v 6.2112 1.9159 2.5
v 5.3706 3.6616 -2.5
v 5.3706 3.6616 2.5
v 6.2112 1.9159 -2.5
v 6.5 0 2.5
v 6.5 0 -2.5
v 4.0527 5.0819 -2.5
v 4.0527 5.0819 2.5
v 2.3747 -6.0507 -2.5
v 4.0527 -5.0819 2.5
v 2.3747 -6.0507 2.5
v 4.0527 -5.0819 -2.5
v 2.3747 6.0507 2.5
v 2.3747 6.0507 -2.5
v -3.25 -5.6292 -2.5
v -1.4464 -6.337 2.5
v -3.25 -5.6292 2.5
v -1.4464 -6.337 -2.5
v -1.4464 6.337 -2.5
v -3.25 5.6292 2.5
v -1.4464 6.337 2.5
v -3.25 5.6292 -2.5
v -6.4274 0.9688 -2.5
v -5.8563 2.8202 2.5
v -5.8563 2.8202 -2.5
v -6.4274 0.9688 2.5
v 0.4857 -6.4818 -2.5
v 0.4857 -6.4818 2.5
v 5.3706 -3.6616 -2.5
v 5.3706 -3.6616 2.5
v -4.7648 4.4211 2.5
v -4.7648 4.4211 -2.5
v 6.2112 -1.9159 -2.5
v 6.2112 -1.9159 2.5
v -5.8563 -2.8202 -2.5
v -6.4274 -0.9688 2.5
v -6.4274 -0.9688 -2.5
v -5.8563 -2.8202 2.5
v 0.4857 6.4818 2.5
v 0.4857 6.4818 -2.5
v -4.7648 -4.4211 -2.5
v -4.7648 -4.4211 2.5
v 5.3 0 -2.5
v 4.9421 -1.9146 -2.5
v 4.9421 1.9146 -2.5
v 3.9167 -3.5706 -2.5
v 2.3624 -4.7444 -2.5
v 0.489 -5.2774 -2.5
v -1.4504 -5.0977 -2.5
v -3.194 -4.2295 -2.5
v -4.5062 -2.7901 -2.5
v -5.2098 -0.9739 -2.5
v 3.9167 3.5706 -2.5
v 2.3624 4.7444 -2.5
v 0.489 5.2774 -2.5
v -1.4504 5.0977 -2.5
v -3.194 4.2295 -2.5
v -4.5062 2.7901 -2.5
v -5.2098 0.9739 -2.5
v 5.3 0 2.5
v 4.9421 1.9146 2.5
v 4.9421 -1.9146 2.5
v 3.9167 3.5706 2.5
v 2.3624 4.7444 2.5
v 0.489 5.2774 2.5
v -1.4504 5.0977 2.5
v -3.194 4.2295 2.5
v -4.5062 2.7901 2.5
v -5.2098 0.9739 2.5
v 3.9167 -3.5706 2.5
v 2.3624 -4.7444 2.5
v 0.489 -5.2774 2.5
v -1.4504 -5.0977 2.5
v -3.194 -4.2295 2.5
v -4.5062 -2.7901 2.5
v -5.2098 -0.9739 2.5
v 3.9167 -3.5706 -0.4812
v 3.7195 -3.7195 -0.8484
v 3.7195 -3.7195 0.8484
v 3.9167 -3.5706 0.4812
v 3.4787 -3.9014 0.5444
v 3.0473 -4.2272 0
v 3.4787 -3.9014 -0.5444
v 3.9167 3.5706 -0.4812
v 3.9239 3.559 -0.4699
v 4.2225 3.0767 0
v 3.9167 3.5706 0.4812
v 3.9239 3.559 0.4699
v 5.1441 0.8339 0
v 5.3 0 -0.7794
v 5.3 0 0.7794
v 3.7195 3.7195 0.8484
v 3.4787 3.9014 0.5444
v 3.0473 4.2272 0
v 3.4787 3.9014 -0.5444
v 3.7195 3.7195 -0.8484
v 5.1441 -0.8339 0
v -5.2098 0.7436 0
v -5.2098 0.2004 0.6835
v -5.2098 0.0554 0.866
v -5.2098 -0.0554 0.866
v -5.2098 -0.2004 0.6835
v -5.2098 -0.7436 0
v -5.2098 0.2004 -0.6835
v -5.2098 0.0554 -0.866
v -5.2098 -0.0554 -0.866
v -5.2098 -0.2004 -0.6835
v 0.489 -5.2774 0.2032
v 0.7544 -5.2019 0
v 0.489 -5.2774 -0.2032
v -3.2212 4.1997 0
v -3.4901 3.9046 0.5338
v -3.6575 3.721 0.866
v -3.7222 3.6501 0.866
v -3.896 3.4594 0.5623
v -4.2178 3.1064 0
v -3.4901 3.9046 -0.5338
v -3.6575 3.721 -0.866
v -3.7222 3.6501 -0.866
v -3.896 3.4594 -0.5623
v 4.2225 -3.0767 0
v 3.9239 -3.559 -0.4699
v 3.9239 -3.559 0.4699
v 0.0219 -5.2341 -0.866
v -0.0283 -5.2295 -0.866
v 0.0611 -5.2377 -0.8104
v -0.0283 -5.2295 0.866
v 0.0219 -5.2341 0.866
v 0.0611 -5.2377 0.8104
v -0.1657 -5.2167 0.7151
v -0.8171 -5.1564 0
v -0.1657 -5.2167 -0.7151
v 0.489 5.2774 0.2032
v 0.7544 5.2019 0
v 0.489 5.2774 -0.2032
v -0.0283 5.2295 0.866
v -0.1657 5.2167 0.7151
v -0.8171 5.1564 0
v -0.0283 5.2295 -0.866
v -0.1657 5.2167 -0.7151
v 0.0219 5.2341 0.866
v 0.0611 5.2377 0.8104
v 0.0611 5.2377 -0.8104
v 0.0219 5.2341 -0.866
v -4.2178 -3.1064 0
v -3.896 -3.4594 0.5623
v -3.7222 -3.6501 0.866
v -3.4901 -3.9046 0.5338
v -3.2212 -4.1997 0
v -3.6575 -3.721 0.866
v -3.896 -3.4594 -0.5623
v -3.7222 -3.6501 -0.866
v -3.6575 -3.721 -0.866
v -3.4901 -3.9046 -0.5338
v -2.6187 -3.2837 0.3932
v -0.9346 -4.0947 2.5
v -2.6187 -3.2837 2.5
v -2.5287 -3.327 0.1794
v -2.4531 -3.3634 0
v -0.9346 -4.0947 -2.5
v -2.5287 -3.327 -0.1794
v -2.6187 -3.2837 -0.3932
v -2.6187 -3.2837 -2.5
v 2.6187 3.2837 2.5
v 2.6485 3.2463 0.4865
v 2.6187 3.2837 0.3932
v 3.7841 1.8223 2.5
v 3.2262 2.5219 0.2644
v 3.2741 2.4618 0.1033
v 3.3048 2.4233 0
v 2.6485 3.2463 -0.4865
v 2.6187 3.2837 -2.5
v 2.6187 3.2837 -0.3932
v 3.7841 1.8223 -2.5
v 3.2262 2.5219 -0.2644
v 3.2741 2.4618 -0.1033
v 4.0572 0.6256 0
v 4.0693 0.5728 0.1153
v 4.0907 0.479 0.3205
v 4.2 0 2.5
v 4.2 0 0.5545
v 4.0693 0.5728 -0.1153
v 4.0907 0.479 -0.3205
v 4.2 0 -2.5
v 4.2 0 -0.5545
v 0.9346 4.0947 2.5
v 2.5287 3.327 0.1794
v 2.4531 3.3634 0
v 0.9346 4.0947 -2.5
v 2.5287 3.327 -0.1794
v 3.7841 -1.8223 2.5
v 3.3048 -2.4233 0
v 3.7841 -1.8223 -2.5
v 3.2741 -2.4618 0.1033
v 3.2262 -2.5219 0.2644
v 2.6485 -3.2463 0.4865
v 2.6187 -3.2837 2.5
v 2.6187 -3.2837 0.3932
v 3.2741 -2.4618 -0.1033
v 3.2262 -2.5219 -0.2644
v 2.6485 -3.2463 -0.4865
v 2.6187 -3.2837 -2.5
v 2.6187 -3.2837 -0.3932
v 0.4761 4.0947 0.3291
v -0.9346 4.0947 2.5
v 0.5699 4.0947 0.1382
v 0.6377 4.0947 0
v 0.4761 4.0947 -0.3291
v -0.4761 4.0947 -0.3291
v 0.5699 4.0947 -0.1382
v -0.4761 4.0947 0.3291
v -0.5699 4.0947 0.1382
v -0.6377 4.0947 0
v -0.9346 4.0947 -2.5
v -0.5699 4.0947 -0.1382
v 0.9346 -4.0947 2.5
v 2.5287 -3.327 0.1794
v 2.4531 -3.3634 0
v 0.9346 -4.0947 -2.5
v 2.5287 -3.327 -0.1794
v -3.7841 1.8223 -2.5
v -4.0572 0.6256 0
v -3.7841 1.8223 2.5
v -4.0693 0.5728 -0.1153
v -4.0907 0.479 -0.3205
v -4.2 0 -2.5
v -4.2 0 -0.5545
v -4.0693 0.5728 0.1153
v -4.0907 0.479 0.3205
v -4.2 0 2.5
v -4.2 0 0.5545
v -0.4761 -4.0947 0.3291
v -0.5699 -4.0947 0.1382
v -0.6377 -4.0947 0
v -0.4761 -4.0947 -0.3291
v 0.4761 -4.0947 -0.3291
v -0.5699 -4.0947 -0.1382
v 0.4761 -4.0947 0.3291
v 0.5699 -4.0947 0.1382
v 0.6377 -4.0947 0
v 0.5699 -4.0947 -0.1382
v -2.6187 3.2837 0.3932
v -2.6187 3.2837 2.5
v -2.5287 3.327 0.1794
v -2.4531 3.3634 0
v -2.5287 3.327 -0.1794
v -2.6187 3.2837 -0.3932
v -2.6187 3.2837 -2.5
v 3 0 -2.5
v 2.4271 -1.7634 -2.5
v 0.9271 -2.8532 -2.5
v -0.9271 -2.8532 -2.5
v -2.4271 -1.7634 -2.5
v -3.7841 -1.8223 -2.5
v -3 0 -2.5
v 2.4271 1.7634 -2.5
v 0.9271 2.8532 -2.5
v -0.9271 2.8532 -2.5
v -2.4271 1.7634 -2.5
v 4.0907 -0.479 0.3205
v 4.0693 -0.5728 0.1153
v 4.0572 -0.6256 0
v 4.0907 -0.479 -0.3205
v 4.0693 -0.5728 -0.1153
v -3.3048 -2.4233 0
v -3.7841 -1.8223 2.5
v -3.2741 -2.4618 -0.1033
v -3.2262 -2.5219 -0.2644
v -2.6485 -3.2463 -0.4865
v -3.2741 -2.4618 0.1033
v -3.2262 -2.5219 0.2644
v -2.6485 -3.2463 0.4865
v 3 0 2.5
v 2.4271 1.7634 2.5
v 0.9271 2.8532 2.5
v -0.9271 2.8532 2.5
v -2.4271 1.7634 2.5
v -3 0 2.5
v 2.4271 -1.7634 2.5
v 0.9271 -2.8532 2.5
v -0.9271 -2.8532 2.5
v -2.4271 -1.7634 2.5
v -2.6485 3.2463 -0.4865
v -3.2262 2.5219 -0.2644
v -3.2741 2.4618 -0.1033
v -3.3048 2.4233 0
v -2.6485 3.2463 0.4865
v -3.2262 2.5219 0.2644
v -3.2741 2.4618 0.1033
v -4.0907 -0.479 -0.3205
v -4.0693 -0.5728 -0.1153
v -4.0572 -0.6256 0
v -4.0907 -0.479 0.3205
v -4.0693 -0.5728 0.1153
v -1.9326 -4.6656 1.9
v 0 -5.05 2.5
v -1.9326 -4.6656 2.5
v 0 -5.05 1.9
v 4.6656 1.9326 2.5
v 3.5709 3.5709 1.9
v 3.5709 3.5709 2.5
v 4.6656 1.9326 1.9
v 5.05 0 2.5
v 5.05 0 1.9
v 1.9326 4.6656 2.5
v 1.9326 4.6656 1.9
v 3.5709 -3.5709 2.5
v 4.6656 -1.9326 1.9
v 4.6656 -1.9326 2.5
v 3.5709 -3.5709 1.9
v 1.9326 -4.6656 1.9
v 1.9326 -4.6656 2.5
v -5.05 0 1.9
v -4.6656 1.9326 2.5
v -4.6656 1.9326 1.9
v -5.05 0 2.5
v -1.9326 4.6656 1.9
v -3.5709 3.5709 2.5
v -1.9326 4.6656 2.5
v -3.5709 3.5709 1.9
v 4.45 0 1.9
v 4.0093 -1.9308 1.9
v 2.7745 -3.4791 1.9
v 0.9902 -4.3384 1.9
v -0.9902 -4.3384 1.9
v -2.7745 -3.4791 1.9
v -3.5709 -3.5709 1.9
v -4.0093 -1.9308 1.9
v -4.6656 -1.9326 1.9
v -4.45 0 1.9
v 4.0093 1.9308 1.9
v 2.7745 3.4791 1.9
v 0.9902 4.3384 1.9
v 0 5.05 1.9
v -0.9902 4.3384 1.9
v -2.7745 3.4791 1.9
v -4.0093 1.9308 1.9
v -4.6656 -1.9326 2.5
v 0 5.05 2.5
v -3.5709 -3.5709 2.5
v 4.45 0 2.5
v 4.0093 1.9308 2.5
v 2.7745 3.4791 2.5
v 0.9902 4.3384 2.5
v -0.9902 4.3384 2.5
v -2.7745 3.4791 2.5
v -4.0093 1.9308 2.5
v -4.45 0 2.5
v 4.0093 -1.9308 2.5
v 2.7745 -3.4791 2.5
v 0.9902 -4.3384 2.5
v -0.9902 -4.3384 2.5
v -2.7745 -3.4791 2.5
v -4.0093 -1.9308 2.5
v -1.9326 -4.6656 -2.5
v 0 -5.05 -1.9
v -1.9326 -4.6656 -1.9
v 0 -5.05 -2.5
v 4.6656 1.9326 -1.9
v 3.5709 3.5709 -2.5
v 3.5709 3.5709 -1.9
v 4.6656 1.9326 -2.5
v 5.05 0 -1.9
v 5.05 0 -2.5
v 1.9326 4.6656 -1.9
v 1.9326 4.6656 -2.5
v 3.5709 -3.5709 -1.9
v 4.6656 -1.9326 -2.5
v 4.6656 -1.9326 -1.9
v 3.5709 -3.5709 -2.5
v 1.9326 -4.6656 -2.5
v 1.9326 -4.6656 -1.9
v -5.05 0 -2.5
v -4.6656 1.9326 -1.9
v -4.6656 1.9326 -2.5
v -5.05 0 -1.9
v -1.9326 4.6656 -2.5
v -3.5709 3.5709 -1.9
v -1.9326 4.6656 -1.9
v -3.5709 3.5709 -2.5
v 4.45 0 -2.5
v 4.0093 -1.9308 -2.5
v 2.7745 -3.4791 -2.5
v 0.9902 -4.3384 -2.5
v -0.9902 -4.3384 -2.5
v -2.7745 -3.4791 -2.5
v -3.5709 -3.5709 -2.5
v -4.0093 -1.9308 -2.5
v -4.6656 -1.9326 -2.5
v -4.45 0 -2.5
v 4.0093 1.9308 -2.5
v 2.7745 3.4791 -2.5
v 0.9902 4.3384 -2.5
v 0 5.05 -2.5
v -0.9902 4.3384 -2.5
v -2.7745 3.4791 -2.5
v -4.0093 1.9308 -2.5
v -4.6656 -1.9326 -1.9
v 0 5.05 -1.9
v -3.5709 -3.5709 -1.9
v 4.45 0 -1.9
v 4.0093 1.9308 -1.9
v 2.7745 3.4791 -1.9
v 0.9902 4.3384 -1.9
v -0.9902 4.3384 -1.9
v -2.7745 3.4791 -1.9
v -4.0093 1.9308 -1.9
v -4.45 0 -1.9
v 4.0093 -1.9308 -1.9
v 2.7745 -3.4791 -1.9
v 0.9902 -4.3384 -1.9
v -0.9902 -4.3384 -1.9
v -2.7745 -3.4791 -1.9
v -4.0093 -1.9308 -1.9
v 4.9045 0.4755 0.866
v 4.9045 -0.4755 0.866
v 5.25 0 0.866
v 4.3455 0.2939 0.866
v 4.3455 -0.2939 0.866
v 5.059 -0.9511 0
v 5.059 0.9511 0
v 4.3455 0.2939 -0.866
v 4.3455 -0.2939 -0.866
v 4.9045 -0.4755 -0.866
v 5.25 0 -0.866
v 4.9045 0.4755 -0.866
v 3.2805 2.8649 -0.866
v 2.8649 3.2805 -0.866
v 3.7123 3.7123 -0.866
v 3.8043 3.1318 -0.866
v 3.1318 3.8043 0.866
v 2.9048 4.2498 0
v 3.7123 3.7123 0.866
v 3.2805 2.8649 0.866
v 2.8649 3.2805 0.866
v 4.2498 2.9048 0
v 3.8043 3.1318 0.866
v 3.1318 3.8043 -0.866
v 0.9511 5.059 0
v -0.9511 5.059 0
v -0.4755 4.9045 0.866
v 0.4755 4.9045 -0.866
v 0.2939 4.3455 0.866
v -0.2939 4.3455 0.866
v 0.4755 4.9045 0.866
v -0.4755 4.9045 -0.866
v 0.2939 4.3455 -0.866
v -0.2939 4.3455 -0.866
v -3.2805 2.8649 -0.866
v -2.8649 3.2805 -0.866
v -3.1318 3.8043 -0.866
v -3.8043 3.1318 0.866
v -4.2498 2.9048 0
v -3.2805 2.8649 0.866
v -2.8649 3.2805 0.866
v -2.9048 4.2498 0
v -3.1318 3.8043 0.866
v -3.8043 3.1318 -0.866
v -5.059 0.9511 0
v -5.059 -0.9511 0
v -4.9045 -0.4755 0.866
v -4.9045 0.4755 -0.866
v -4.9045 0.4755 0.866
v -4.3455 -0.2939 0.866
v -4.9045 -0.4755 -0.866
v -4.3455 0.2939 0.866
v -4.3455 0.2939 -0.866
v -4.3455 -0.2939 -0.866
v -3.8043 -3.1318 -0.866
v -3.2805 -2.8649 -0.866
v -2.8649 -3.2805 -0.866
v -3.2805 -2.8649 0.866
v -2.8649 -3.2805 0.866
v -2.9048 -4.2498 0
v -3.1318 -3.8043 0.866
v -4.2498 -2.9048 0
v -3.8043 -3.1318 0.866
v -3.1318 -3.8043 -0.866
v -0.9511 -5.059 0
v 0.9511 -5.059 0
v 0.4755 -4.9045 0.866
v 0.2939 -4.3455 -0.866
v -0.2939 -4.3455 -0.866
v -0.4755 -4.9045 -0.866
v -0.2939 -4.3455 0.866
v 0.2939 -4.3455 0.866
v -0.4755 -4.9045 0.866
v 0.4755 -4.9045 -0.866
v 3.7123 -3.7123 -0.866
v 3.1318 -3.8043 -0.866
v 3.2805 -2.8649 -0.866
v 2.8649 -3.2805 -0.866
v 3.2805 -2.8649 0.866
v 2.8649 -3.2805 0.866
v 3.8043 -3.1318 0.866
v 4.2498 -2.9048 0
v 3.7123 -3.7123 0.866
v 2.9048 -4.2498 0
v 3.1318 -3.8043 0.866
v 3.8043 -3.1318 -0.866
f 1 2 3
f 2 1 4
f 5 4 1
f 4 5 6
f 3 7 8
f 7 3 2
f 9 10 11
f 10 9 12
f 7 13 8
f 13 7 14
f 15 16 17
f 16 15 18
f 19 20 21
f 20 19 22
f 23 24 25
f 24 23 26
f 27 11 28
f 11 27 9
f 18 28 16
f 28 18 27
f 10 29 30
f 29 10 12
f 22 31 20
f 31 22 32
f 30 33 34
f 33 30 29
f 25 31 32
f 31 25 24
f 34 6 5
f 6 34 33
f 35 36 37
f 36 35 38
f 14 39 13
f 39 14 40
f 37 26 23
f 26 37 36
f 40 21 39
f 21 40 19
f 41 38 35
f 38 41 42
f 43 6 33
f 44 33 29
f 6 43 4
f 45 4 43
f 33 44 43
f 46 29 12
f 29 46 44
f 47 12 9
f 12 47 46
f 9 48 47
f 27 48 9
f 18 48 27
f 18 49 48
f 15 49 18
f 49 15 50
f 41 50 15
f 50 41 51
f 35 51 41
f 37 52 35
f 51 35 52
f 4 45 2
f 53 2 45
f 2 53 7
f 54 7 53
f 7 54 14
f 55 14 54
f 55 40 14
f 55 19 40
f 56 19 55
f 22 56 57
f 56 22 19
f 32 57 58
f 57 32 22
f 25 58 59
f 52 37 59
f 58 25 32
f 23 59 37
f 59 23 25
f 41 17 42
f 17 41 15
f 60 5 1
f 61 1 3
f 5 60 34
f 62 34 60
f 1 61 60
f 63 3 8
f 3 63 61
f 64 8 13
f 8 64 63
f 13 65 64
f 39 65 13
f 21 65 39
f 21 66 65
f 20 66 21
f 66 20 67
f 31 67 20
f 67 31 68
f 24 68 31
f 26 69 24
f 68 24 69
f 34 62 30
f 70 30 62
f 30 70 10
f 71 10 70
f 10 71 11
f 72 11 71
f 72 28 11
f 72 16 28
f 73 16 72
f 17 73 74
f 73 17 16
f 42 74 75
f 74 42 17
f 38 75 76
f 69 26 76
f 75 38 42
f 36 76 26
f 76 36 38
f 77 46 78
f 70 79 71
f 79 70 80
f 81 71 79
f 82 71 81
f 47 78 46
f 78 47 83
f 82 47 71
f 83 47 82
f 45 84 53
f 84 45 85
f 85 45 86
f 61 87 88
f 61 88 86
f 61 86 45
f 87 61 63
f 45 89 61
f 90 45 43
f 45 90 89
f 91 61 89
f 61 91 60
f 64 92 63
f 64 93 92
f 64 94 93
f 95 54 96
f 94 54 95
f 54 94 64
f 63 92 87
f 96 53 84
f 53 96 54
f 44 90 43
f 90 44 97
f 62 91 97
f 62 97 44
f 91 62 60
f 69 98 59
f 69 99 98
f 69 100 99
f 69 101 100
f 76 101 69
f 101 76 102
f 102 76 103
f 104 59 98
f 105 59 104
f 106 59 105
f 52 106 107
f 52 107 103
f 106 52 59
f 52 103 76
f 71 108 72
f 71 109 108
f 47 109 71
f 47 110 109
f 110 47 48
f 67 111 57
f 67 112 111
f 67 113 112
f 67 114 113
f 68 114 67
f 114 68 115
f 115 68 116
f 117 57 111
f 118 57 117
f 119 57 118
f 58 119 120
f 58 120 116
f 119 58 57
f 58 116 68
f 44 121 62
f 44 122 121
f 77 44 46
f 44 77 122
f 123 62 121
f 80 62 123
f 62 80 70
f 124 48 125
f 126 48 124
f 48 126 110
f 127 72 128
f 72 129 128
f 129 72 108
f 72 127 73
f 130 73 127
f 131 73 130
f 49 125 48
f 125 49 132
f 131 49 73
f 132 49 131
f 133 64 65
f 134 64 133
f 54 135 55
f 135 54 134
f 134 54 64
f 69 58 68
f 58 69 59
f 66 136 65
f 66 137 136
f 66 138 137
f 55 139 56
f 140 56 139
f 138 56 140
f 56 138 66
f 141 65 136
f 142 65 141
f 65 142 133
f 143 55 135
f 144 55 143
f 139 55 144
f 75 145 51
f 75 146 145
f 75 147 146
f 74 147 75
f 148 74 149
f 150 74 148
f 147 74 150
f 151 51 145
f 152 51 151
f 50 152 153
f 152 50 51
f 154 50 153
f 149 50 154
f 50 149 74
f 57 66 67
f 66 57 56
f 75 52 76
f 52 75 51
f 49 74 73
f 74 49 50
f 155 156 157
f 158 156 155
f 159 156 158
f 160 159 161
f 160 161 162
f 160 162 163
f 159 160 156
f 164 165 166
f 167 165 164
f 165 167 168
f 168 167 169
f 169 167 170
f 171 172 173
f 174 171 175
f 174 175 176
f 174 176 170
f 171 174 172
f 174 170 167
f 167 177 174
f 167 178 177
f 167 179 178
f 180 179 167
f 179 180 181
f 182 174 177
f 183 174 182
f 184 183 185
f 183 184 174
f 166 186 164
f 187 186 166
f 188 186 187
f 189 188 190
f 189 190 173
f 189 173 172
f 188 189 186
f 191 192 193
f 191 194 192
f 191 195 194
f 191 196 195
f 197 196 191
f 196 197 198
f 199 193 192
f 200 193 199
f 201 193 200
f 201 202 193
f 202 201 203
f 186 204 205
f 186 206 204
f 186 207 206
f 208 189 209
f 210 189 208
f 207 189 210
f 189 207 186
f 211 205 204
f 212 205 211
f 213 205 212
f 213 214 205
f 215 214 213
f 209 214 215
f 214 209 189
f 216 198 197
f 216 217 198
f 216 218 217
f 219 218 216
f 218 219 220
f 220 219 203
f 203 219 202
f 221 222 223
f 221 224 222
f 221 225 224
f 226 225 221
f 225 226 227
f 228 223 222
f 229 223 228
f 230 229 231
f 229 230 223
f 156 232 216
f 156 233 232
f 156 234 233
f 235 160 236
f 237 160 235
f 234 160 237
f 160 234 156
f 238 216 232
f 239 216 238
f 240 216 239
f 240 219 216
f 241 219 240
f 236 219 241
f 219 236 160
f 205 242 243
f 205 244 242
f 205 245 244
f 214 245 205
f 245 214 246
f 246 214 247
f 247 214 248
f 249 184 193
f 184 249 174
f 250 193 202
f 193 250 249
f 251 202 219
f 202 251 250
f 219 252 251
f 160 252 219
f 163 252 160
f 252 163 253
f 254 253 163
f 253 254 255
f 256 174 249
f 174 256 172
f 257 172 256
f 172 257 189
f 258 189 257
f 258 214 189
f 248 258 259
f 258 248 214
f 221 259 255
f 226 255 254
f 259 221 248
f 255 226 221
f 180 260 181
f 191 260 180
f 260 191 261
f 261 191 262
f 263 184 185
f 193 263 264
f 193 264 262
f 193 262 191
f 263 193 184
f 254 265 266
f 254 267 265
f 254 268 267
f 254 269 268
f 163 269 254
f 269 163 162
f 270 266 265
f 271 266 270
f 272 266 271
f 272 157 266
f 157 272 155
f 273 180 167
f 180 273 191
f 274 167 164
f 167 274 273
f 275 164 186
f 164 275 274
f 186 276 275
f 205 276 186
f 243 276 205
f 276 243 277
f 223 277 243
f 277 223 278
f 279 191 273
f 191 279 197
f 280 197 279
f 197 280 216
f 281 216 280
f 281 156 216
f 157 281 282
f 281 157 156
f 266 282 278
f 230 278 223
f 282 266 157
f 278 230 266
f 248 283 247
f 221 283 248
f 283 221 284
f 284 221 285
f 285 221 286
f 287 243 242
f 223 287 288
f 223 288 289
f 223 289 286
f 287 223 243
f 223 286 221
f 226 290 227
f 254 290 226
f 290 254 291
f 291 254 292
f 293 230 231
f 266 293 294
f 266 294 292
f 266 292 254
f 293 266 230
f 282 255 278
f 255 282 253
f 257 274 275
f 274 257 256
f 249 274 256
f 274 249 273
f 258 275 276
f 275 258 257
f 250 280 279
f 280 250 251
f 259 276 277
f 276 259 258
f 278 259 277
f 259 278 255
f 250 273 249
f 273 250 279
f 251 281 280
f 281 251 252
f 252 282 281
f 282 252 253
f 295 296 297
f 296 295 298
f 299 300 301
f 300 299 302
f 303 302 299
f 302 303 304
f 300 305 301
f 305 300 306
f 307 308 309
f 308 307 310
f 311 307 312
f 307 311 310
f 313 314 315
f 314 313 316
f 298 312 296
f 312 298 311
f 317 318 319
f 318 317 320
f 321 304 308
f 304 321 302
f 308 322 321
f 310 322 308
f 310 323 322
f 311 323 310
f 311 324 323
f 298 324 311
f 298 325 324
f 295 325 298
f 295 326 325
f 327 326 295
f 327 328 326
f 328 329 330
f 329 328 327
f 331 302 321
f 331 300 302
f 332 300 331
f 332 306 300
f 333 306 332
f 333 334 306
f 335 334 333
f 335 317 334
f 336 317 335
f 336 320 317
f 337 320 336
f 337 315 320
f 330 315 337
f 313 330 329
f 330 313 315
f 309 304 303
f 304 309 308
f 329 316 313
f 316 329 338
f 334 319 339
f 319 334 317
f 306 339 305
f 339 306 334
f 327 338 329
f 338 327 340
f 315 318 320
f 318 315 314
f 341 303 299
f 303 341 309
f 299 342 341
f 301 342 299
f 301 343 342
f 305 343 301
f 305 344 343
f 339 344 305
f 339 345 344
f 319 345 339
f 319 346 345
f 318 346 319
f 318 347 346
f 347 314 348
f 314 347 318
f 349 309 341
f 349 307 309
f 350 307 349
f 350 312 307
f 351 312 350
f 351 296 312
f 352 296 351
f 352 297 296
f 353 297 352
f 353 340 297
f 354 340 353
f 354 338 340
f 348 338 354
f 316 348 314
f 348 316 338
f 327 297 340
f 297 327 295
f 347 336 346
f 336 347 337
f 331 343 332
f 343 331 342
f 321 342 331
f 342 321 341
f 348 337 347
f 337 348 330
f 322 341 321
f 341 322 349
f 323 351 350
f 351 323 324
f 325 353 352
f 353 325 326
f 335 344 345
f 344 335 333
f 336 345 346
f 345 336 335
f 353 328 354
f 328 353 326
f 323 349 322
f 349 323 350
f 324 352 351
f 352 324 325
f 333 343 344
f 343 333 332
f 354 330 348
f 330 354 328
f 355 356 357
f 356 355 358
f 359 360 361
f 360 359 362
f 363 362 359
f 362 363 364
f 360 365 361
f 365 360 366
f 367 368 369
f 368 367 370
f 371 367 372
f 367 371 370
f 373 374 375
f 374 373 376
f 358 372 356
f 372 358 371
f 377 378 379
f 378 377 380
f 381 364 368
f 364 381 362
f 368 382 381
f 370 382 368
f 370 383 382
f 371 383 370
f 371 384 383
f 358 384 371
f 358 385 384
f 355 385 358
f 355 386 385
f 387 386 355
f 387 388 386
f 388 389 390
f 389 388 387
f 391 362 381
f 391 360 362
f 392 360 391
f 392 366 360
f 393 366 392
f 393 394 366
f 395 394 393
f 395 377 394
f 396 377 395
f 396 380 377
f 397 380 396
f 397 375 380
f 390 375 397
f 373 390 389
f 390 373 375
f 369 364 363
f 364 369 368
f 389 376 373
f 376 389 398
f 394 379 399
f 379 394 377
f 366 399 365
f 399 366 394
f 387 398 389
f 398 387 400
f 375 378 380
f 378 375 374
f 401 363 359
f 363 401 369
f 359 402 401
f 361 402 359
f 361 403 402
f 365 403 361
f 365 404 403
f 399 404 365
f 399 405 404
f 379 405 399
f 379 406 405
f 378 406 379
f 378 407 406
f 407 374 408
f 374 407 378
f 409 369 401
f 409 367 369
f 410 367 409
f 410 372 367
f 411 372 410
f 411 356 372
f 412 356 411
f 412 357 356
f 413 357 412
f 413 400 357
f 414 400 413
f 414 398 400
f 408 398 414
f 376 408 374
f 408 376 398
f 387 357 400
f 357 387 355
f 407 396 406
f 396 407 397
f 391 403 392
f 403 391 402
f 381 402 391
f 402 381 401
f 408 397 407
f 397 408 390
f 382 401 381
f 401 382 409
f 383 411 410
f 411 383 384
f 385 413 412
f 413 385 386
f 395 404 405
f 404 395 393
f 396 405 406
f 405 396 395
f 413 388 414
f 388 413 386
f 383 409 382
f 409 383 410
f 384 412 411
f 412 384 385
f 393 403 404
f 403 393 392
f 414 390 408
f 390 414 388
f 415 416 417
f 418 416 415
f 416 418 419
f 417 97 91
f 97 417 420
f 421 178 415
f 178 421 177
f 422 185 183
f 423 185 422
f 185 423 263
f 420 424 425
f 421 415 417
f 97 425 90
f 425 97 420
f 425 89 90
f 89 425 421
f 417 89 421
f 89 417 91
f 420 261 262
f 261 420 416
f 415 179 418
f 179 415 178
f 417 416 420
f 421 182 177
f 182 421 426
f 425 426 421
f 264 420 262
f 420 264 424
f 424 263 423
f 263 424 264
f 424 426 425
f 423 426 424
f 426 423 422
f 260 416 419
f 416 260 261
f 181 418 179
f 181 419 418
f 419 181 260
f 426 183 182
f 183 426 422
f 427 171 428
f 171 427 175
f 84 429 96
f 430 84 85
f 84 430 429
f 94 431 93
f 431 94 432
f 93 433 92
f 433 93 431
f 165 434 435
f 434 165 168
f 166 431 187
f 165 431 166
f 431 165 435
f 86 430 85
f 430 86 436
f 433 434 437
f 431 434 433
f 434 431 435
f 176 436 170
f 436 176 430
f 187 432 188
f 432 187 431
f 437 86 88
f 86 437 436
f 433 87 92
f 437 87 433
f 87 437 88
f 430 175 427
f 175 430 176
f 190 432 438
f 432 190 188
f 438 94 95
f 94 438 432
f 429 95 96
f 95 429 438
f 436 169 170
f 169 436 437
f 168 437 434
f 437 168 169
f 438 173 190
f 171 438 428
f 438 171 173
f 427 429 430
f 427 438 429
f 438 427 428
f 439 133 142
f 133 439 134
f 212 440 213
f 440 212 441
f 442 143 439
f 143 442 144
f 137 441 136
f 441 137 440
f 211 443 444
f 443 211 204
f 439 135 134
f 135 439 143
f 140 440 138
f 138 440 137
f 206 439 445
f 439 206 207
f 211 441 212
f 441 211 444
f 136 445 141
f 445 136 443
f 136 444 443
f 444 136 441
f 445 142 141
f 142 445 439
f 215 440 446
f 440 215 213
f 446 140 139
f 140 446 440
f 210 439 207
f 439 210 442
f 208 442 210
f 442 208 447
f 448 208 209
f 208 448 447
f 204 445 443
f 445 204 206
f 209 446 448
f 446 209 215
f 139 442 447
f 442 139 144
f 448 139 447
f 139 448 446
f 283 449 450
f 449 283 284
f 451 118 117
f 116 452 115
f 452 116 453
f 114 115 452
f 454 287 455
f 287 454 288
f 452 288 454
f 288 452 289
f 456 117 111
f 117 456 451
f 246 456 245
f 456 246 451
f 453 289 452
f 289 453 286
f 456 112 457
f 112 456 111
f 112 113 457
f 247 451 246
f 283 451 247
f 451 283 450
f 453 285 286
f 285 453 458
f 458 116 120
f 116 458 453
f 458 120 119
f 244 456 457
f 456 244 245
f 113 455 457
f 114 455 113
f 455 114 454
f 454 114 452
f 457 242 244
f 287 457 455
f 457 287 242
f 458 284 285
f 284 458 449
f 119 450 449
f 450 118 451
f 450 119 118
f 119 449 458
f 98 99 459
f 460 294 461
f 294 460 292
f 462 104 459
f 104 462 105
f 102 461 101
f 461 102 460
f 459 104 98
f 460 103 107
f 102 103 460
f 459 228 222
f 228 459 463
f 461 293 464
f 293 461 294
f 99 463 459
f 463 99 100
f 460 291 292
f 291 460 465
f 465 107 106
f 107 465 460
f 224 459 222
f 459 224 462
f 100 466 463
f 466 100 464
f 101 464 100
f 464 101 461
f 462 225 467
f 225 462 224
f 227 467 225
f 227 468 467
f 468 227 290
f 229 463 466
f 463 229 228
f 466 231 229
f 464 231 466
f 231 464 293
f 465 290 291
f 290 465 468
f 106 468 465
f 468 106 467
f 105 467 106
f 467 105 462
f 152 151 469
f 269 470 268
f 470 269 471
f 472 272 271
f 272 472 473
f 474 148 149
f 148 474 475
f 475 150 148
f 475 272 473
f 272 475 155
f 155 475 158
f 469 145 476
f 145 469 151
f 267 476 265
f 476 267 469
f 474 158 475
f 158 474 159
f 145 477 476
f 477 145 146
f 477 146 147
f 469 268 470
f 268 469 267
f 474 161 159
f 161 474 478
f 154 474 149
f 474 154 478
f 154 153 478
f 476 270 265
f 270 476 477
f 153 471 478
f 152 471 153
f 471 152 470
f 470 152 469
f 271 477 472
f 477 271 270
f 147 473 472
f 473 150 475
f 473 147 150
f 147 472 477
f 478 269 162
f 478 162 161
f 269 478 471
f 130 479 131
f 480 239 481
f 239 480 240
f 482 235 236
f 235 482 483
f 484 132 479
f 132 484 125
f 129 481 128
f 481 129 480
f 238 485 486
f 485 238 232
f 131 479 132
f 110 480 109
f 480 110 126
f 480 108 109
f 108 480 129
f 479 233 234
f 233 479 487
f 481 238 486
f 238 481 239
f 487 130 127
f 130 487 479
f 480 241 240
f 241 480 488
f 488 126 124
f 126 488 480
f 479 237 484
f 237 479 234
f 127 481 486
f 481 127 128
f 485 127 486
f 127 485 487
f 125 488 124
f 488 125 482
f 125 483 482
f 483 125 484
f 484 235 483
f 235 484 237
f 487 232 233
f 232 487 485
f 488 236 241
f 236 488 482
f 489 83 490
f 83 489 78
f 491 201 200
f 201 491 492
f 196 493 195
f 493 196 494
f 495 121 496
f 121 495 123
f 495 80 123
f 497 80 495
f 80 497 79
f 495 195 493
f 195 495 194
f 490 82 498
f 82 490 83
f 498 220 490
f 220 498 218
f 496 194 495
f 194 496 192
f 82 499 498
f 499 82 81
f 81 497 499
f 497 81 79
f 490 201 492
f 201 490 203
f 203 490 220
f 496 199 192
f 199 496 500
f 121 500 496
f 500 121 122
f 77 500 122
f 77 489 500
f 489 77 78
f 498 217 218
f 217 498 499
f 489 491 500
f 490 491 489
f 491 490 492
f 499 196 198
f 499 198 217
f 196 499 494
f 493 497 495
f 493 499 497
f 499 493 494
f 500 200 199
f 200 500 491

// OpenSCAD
// Parameters
bore_diameter_mm = 6; //[3:12:0.1]
outer_diameter_mm = 13; //[6.5:26:0.1]
width_mm = 5; //[2.5:10:0.1]
bore_radius_mm = 3; //[1.5:6:0.1]
outer_radius_mm = 6.5; //[3.25:13:0.1]
ring_radial_thickness_mm = 1.2; //[0.6:2.4:0.1]
ring_axial_margin_mm = 0.4; //[0.2:1:0.05]
shield_thickness_mm = 0.6; //[0.3:1.2:0.05]
shield_radial_clearance_mm = 0.25; //[0.1:0.6:0.05]
ball_diameter_mm = 2; //[1:4:0.1]
ball_count = 8; //[6:14:1]
ball_overlap_mm = 0.6; //[0.3:1.2:0.05]
eps_mm = 0.2; //[0.05:0.5:0.05]

// Outer Ring
module outer_ring() {
  color("Silver") difference() {
    cylinder(r=outer_diameter_mm/2, h=width_mm, center=true);
    cylinder(r=outer_diameter_mm/2 - ring_radial_thickness_mm, h=width_mm + 2*eps_mm, center=true);
  }
}

// Inner Ring
module inner_ring() {
  color("Silver") difference() {
    cylinder(r=bore_diameter_mm/2 + ring_radial_thickness_mm, h=width_mm, center=true);
    cylinder(r=bore_diameter_mm/2, h=width_mm + 2*eps_mm, center=true);
  }
}

// Shield or Seal
module shield_or_seal() {
  color("DimGray") difference() {
    cylinder(r=outer_diameter_mm/2 - ring_radial_thickness_mm - shield_radial_clearance_mm, h=shield_thickness_mm, center=true);
    cylinder(r=bore_diameter_mm/2 + ring_radial_thickness_mm + shield_radial_clearance_mm, h=shield_thickness_mm + 2*eps_mm, center=true);
  }
}

// Bearing Ball
module bearing_ball() {
  color("Copper") {
    for (i = [0:ball_count-1]) {
      rotate([0, 0, i*360/ball_count])
      translate([((bore_diameter_mm/2 + ring_radial_thickness_mm) + (outer_diameter_mm/2 - ring_radial_thickness_mm))/2, 0, 0])
      sphere(r=ball_diameter_mm/2, center=true);
    }
  }
}

// Ball Bearing Assembly
module ball_bearing() {
  union() {
    outer_ring();
    inner_ring();
    translate([0, 0, (width_mm - shield_thickness_mm)/2]) shield_or_seal();
    translate([0, 0, -(width_mm - shield_thickness_mm)/2]) shield_or_seal();
    bearing_ball();
  }
}

// Final Assembly
module assembly() {
  ball_bearing();
}

assembly();
